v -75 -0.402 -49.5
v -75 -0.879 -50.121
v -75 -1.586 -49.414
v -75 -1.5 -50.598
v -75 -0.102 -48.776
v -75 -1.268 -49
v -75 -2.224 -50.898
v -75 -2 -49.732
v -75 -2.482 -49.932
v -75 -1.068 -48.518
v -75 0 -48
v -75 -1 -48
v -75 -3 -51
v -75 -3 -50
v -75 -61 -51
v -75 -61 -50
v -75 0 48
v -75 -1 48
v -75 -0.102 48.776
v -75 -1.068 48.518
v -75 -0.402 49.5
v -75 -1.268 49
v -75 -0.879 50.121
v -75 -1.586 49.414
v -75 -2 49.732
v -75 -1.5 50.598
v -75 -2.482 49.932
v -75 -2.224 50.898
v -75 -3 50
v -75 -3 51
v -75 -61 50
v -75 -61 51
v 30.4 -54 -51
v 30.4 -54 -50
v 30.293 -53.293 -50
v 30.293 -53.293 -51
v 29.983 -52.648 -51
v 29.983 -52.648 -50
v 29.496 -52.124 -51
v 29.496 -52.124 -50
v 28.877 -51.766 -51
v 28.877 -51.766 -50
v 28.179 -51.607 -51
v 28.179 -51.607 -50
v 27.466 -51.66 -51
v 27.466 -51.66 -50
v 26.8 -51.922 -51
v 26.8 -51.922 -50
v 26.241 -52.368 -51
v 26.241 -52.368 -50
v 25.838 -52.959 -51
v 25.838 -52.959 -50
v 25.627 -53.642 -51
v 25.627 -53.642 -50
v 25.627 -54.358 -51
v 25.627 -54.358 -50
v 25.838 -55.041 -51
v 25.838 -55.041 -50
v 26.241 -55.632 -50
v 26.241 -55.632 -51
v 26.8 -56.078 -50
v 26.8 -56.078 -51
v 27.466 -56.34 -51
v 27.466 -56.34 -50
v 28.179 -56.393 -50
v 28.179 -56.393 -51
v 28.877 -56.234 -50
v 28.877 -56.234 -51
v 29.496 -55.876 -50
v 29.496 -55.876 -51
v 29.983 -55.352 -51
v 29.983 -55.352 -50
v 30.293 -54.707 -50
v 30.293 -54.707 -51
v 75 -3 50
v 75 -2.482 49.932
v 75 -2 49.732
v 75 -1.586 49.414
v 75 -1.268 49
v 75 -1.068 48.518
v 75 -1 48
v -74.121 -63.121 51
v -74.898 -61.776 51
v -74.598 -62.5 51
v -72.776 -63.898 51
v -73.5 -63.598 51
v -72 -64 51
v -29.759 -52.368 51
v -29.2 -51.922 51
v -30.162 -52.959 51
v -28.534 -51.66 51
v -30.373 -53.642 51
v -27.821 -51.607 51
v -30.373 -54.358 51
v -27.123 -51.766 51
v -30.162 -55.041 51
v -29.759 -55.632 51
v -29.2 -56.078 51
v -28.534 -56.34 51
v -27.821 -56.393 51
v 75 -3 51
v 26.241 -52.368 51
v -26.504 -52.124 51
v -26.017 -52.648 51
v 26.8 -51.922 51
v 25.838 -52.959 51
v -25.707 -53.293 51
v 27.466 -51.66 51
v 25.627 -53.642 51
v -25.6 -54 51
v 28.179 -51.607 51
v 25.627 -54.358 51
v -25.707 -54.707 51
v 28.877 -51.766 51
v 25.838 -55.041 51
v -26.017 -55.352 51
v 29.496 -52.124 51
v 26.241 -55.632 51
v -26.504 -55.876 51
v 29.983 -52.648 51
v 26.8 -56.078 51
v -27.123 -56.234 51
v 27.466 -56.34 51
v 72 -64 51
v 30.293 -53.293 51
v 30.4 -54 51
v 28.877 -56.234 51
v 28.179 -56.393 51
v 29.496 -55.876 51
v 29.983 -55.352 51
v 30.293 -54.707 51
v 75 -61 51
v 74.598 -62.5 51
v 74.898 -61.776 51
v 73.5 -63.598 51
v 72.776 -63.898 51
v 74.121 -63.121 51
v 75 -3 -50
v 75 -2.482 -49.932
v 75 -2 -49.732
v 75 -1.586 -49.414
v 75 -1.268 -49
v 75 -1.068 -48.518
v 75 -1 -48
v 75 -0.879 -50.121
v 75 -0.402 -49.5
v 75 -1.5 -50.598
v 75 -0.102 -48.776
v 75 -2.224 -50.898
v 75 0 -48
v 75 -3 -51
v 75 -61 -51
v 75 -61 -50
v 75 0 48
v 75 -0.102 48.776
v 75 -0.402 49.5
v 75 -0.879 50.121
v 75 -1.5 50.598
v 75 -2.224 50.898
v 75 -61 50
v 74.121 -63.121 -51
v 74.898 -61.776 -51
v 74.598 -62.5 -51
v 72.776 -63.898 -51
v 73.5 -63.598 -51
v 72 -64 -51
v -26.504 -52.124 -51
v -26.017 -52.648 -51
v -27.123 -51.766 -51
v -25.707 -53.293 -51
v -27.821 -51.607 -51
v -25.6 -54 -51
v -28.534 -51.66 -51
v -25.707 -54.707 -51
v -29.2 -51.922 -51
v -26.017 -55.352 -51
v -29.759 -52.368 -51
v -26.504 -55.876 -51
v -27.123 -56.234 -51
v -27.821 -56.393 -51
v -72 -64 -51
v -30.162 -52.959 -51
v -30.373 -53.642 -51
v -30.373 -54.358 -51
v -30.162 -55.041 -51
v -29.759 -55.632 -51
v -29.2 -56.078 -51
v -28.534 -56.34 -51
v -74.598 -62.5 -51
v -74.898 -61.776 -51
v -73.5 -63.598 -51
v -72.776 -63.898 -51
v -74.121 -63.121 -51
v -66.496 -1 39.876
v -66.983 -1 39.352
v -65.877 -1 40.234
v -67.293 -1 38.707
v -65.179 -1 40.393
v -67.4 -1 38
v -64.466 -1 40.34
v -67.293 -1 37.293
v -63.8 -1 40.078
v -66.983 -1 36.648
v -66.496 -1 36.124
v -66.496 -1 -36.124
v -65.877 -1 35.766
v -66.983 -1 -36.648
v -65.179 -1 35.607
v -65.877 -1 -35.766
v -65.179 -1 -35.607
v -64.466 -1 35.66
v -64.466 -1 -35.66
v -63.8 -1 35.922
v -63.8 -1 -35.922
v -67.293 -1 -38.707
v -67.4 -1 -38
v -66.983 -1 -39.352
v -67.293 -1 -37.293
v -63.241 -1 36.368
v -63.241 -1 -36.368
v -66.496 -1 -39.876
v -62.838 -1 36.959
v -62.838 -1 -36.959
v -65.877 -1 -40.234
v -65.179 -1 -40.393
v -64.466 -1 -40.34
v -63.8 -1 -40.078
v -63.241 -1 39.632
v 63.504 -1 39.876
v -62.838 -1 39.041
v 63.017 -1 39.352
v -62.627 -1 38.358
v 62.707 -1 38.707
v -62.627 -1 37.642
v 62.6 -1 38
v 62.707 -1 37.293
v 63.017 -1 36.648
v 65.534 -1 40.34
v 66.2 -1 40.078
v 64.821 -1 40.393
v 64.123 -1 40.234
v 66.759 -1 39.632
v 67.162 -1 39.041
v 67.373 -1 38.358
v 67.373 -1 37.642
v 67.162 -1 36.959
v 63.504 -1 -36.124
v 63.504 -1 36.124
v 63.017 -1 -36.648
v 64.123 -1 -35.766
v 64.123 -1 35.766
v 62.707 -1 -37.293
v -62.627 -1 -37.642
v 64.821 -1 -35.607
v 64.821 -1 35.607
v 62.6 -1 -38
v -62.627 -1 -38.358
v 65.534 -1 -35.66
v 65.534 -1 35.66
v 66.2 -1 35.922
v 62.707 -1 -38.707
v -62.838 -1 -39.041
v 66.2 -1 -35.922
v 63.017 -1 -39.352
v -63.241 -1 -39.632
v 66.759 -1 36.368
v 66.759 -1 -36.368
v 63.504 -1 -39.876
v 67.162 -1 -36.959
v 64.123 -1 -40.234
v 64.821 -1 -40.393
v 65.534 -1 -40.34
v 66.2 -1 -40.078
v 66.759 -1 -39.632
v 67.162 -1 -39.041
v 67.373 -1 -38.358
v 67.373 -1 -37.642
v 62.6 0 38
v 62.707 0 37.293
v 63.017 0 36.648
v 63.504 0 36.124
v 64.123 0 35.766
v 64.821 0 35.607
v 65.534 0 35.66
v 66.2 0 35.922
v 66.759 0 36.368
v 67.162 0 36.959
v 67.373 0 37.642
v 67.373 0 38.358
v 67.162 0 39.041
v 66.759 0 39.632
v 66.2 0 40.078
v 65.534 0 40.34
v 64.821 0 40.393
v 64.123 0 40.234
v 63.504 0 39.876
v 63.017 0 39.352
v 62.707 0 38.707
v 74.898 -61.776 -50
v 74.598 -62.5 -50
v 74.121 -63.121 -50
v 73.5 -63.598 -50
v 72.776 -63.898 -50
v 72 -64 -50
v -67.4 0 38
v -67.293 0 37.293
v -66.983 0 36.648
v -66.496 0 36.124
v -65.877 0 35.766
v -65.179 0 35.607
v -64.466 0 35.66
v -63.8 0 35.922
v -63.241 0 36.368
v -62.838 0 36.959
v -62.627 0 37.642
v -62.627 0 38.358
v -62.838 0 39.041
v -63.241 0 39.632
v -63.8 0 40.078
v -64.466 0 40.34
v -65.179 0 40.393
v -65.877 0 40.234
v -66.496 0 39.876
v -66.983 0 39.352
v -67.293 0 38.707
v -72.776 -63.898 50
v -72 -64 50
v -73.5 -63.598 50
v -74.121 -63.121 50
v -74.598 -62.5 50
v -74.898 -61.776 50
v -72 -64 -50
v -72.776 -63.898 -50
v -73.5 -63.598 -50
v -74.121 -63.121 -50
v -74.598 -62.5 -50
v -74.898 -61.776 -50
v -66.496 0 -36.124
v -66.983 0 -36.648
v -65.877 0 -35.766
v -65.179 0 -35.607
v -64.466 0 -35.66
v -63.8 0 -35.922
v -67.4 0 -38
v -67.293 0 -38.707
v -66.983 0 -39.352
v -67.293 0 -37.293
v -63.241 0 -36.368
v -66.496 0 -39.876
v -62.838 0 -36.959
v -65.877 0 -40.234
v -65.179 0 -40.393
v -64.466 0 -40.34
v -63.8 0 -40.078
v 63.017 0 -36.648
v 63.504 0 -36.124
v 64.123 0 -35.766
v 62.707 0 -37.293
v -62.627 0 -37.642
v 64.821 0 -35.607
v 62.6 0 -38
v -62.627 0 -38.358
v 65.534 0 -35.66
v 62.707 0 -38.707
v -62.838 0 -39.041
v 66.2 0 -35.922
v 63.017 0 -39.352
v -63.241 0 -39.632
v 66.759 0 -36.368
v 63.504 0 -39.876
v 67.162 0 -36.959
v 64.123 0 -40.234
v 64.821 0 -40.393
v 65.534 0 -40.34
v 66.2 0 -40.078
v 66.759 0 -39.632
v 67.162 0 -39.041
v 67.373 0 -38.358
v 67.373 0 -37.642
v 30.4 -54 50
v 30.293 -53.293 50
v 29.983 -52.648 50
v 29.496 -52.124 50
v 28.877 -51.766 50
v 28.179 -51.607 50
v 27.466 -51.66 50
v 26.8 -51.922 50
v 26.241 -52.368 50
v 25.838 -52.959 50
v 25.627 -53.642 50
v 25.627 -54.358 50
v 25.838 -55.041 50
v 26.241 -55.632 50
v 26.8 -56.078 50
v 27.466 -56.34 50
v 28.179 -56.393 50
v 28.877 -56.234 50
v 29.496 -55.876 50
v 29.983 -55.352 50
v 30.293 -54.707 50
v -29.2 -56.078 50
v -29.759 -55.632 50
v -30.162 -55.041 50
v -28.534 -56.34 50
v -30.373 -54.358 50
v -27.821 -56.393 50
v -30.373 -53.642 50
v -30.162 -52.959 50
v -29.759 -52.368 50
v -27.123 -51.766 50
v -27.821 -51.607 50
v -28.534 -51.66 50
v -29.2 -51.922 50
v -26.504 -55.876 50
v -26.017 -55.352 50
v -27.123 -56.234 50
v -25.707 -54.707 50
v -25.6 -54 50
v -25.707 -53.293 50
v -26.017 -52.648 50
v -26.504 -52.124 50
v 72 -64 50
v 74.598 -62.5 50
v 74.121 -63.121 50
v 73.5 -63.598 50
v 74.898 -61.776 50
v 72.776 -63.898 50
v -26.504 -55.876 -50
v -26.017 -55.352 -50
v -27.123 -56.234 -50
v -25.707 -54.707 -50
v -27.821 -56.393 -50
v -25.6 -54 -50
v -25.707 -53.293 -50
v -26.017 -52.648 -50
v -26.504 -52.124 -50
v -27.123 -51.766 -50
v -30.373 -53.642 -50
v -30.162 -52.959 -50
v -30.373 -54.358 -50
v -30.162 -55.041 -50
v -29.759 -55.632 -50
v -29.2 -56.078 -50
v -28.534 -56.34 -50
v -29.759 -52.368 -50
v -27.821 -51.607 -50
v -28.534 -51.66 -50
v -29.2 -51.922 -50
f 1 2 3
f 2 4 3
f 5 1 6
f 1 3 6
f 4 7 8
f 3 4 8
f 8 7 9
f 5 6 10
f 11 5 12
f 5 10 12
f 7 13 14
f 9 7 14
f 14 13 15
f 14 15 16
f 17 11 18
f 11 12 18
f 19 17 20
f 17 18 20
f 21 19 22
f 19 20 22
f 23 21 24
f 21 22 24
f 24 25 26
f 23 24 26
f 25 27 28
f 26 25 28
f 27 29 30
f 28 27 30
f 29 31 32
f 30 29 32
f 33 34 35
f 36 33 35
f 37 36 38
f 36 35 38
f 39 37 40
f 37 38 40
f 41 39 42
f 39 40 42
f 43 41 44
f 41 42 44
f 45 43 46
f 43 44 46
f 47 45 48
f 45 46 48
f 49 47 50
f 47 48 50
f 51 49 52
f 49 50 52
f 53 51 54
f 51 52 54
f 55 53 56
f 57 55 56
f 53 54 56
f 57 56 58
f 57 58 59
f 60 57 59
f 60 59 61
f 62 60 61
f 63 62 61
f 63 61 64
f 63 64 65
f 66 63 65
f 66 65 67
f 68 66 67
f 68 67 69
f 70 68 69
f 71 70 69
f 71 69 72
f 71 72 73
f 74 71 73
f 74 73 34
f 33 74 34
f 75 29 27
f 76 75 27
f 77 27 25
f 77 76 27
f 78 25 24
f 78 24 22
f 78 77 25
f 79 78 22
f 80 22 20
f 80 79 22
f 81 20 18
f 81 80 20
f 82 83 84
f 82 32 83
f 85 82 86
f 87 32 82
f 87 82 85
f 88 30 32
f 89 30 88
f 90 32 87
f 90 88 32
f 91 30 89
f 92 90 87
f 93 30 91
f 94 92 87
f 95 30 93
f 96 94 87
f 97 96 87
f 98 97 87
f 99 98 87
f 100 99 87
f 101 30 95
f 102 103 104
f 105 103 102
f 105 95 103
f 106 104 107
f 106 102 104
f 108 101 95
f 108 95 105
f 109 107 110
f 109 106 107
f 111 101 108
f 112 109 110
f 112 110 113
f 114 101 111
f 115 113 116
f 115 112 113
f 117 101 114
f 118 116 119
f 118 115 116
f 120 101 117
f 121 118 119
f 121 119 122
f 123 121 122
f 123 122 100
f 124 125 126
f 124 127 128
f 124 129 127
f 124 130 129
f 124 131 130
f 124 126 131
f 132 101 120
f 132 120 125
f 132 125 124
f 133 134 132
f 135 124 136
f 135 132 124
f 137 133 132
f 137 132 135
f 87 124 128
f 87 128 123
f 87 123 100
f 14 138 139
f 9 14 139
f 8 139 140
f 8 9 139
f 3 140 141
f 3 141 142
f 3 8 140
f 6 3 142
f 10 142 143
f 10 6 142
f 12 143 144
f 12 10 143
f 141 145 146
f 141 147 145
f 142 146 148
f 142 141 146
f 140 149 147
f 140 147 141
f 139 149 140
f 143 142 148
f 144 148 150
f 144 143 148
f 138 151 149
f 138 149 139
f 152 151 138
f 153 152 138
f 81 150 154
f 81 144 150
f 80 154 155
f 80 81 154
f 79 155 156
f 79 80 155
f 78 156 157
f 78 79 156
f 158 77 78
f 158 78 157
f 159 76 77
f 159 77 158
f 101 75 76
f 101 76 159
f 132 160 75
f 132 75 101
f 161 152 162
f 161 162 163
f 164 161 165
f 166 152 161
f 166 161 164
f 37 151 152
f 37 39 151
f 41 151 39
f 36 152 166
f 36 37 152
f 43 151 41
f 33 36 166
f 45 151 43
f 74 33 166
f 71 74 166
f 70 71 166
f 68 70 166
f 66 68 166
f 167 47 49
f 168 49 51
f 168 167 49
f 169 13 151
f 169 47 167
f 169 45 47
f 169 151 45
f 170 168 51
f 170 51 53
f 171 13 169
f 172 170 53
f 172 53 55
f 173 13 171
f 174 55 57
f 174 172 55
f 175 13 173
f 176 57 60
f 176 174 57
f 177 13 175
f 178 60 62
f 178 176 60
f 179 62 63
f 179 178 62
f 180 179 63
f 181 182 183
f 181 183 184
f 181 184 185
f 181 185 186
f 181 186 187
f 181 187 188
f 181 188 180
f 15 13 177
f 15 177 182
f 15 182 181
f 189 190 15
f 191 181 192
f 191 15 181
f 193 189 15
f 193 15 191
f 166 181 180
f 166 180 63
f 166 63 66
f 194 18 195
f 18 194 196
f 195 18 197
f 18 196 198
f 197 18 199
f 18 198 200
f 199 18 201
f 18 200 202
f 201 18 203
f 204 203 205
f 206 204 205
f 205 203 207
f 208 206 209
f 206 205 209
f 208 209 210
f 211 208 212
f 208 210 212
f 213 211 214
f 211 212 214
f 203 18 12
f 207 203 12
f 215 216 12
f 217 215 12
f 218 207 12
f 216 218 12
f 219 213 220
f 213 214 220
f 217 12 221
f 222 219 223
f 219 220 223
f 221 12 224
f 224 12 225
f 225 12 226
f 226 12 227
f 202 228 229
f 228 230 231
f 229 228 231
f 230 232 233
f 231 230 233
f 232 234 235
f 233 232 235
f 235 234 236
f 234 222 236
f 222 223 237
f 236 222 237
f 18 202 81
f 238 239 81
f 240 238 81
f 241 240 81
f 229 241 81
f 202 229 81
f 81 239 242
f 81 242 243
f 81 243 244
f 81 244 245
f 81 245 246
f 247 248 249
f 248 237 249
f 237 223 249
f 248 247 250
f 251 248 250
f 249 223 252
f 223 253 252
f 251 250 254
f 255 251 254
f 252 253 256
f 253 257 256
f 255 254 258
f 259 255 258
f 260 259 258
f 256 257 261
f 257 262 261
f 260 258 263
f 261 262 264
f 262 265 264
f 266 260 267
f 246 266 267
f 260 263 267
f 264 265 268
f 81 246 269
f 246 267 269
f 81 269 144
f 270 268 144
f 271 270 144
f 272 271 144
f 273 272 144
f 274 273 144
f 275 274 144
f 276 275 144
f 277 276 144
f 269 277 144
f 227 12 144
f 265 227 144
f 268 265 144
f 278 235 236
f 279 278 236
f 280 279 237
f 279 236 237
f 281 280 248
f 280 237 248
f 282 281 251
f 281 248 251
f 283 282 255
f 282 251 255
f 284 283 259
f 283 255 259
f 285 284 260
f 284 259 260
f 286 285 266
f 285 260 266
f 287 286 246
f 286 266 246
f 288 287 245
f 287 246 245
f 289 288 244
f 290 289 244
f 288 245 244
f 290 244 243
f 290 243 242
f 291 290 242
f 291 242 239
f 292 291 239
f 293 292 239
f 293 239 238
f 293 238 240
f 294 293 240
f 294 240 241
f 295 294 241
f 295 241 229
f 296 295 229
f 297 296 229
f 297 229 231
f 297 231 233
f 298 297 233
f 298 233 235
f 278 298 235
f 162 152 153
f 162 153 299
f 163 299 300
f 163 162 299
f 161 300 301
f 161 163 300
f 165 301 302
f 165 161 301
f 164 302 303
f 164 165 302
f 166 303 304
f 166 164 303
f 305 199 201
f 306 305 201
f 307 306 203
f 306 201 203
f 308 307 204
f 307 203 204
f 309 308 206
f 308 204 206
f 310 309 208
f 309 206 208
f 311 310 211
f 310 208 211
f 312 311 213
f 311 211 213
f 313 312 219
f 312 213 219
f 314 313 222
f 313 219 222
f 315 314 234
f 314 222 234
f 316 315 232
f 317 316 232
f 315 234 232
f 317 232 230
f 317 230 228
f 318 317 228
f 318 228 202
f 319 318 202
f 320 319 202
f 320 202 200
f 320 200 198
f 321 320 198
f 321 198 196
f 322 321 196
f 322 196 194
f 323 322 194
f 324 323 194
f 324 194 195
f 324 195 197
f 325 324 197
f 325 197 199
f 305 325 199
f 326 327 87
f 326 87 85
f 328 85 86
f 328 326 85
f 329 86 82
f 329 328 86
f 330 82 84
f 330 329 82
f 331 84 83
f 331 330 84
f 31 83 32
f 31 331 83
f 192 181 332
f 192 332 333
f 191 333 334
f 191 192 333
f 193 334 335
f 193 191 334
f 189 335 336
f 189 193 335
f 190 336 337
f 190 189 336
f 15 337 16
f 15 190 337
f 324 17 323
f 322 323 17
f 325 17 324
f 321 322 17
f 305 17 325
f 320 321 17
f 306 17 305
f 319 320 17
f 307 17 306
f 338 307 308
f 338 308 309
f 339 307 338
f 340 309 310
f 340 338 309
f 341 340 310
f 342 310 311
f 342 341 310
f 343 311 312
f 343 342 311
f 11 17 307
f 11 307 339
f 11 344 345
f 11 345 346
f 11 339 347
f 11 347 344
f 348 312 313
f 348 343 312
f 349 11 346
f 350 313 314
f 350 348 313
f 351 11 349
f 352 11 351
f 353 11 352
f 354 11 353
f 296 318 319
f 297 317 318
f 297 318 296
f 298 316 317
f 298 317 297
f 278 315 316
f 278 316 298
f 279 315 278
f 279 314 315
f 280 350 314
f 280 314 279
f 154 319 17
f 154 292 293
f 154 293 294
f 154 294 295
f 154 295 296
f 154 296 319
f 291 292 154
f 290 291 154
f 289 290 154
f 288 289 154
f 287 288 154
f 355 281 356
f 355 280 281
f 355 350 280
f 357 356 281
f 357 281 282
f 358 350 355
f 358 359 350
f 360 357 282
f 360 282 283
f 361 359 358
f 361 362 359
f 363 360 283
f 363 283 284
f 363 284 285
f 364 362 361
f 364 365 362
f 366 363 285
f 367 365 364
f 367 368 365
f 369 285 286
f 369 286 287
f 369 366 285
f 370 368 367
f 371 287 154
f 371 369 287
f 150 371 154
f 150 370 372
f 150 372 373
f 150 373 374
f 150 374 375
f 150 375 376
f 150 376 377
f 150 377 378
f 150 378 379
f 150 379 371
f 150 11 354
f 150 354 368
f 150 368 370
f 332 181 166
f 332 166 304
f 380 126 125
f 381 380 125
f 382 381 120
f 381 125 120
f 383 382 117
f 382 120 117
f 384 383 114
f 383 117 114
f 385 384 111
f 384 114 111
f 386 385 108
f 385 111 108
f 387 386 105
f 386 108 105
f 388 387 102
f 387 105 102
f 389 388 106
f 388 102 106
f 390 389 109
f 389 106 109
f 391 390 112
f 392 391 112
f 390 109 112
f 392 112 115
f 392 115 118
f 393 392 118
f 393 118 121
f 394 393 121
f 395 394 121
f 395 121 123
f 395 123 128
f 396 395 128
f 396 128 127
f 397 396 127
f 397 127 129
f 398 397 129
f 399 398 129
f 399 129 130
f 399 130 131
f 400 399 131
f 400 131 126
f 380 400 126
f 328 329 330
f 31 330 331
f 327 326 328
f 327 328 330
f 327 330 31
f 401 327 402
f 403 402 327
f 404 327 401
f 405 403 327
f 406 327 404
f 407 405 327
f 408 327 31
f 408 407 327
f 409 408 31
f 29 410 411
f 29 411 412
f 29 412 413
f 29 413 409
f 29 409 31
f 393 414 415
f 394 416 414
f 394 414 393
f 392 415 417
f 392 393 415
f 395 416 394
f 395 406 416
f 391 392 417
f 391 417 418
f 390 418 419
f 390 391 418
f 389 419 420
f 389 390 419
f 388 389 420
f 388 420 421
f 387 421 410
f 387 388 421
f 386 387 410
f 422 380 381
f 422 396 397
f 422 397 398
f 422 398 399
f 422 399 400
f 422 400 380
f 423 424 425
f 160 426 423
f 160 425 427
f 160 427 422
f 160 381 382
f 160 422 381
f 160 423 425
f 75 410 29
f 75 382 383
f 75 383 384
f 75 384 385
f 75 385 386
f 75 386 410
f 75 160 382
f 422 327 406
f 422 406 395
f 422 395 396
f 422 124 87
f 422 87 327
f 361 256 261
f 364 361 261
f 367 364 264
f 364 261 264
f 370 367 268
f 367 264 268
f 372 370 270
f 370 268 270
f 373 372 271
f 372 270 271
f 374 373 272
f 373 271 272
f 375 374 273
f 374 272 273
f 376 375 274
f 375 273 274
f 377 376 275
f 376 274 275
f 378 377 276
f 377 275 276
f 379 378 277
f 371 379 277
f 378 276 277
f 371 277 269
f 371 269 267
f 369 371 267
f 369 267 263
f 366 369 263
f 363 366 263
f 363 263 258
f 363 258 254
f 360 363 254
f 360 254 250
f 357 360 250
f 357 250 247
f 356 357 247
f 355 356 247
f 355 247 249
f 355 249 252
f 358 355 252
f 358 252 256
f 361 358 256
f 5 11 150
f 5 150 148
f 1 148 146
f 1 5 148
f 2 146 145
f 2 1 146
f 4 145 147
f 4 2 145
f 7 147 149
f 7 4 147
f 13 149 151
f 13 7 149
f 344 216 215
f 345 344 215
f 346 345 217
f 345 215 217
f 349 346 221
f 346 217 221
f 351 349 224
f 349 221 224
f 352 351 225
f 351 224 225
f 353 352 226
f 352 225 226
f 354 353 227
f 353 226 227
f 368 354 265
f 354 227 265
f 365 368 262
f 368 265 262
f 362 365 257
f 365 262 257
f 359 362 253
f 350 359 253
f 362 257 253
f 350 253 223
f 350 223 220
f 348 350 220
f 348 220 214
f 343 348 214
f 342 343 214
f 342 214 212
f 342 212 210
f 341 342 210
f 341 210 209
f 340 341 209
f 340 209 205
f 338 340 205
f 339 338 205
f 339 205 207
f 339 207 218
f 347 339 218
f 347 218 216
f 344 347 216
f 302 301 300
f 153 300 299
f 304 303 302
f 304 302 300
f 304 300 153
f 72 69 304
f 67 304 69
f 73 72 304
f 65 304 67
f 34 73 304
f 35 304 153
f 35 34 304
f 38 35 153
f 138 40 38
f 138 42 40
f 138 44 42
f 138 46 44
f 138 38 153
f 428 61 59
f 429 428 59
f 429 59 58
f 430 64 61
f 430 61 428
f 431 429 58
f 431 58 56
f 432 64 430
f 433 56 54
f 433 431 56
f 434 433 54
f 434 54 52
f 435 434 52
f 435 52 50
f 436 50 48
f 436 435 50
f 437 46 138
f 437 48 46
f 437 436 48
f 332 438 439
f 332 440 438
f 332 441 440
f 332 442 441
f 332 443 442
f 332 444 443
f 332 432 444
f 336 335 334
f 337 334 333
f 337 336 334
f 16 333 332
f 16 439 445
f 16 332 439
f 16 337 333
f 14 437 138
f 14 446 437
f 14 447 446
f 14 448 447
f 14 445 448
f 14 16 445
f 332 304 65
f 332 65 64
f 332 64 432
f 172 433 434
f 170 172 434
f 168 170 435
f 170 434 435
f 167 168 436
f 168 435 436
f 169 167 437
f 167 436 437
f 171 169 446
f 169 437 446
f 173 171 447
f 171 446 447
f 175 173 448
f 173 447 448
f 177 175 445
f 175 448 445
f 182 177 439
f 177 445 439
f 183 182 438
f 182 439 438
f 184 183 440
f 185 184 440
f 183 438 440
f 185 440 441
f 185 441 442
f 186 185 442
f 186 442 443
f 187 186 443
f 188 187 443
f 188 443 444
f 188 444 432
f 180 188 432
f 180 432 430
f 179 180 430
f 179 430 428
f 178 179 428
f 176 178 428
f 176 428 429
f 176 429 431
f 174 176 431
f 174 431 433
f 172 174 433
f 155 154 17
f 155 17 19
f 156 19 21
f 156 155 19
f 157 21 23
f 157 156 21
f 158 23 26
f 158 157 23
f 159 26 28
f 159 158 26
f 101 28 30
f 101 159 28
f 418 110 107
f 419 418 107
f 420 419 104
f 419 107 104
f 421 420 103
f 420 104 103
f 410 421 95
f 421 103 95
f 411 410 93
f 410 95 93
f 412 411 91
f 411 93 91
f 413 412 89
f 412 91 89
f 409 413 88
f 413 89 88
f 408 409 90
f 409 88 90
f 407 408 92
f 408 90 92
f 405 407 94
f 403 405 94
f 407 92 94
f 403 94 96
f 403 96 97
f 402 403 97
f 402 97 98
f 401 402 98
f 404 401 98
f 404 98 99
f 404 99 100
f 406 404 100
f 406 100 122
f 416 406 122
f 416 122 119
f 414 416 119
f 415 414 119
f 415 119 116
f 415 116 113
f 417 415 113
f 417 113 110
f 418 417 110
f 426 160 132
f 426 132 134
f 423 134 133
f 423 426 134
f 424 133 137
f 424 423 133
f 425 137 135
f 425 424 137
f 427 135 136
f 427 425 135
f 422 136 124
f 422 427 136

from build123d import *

# Parameters (mm, degrees)
SKETCH1_W                      = 150
SKETCH1_H                      = 100
BASE_FLANGE1_DEPTH             = 1
EDGE_FLANGE1_STRIP_W           = 8
EDGE_FLANGE1_STRIP_H           = 1
EDGE_FLANGE1_STRIP_CUT_DEPTH   = 150
EDGE_FLANGE1_STRIP_2_W         = 8
EDGE_FLANGE1_STRIP_2_H         = 1
EDGE_FLANGE1_STRIP_CUT_2_DEPTH = 150
EDGE_FLANGE1_DEPTH             = 150
EDGE_FLANGE1_BEND_DEPTH        = 150
BREAK_CORNER1_START            = -51
BREAK_CORNER1_DEPTH            = 102
M4_CLEARANCE_HOLE1_D           = 4.8
M4_CLEARANCE_HOLE2_D           = 4.8


# Read off the part's stored shape, not the designer's step: Break-Corner1
# Sheet-metal steps are written as plain solids
with BuildPart() as part:
    # Sketch1 → Base-Flange1 (new body)
    with BuildSketch(Plane(origin=(0, 0, 0), x_dir=(1, 0, 0), z_dir=(0, 1, 0))):
        Rectangle(SKETCH1_W, SKETCH1_H)
    extrude(amount=-BASE_FLANGE1_DEPTH)

    # Edge-Flange1 strip (across the edge) → Edge-Flange1 strip cut (cut)
    with BuildSketch(Plane(origin=(-75, -1, -50), x_dir=(0, 0, 1), z_dir=(1, 0, 0))):
        with Locations((-2, -0.5)):
            Rectangle(EDGE_FLANGE1_STRIP_W, EDGE_FLANGE1_STRIP_H)
    extrude(amount=EDGE_FLANGE1_STRIP_CUT_DEPTH, mode=Mode.SUBTRACT)

    # Edge-Flange1 strip 2 (across the edge) → Edge-Flange1 strip cut 2 (cut)
    with BuildSketch(Plane(origin=(75, -1, 50), x_dir=(0, 0, -1), z_dir=(-1, 0, 0))):
        with Locations((-2, -0.5)):
            Rectangle(EDGE_FLANGE1_STRIP_2_W, EDGE_FLANGE1_STRIP_2_H)
    extrude(amount=EDGE_FLANGE1_STRIP_CUT_2_DEPTH, mode=Mode.SUBTRACT)

    # Edge-Flange1 section (across the edge) → Edge-Flange1 (add)
    with BuildSketch(Plane(origin=(-75, -1, -50), x_dir=(0, 0, 1), z_dir=(1, 0, 0))):
        with BuildLine():
            Line((-1, 2), (-1, 63))
            Line((-1, 63), (0, 63))
            Line((0, 63), (0, 2))
            ThreePointArc((0, 2), (0.585786438, 0.585786438), (2, 0))
            Line((2, 0), (2, -1))
            ThreePointArc((2, -1), (-0.121320344, -0.121320344), (-1, 2))
        make_face()
    extrude(amount=EDGE_FLANGE1_DEPTH)

    # Edge-Flange1 section 2 (across the edge) → Edge-Flange1 bend (add)
    with BuildSketch(Plane(origin=(75, -1, 50), x_dir=(0, 0, -1), z_dir=(-1, 0, 0))):
        with BuildLine():
            Line((-1, 2), (-1, 63))
            Line((-1, 63), (0, 63))
            Line((0, 63), (0, 2))
            ThreePointArc((0, 2), (0.585786438, 0.585786438), (2, 0))
            Line((2, 0), (2, -1))
            ThreePointArc((2, -1), (-0.121320344, -0.121320344), (-1, 2))
        make_face()
    extrude(amount=EDGE_FLANGE1_BEND_DEPTH)

    # Break-Corner1 outline → Break-Corner1 (cut)
    with BuildSketch(Plane.XY.offset(BREAK_CORNER1_START)):
        with BuildLine():
            Line((-75, -64), (-72, -64))
            ThreePointArc((-72, -64), (-74.121320344, -63.121320344), (-75, -61))
            Line((-75, -61), (-75, -64))
        make_face()
        with BuildLine():
            ThreePointArc((75, -61), (74.121320344, -63.121320344), (72, -64))
            Line((72, -64), (75, -64))
            Line((75, -64), (75, -61))
        make_face()
    extrude(amount=BREAK_CORNER1_DEPTH, mode=Mode.SUBTRACT)

    # M4 Clearance Hole1 (through all)
    with Locations(Plane(origin=(0, 0, -51), x_dir=(-1, 0, 0), z_dir=(0, 0, -1))):
        with Locations((-28, -54), (28, -54)):
            Hole(M4_CLEARANCE_HOLE1_D / 2)

    # M4 Clearance Hole2 (through all)
    with Locations(Plane(origin=(0, 0, 0), x_dir=(1, 0, 0), z_dir=(0, 1, 0))):
        with Locations((-65, 38), (-65, -38), (65, -38), (65, 38)):
            Hole(M4_CLEARANCE_HOLE2_D / 2)


solid = part.part
